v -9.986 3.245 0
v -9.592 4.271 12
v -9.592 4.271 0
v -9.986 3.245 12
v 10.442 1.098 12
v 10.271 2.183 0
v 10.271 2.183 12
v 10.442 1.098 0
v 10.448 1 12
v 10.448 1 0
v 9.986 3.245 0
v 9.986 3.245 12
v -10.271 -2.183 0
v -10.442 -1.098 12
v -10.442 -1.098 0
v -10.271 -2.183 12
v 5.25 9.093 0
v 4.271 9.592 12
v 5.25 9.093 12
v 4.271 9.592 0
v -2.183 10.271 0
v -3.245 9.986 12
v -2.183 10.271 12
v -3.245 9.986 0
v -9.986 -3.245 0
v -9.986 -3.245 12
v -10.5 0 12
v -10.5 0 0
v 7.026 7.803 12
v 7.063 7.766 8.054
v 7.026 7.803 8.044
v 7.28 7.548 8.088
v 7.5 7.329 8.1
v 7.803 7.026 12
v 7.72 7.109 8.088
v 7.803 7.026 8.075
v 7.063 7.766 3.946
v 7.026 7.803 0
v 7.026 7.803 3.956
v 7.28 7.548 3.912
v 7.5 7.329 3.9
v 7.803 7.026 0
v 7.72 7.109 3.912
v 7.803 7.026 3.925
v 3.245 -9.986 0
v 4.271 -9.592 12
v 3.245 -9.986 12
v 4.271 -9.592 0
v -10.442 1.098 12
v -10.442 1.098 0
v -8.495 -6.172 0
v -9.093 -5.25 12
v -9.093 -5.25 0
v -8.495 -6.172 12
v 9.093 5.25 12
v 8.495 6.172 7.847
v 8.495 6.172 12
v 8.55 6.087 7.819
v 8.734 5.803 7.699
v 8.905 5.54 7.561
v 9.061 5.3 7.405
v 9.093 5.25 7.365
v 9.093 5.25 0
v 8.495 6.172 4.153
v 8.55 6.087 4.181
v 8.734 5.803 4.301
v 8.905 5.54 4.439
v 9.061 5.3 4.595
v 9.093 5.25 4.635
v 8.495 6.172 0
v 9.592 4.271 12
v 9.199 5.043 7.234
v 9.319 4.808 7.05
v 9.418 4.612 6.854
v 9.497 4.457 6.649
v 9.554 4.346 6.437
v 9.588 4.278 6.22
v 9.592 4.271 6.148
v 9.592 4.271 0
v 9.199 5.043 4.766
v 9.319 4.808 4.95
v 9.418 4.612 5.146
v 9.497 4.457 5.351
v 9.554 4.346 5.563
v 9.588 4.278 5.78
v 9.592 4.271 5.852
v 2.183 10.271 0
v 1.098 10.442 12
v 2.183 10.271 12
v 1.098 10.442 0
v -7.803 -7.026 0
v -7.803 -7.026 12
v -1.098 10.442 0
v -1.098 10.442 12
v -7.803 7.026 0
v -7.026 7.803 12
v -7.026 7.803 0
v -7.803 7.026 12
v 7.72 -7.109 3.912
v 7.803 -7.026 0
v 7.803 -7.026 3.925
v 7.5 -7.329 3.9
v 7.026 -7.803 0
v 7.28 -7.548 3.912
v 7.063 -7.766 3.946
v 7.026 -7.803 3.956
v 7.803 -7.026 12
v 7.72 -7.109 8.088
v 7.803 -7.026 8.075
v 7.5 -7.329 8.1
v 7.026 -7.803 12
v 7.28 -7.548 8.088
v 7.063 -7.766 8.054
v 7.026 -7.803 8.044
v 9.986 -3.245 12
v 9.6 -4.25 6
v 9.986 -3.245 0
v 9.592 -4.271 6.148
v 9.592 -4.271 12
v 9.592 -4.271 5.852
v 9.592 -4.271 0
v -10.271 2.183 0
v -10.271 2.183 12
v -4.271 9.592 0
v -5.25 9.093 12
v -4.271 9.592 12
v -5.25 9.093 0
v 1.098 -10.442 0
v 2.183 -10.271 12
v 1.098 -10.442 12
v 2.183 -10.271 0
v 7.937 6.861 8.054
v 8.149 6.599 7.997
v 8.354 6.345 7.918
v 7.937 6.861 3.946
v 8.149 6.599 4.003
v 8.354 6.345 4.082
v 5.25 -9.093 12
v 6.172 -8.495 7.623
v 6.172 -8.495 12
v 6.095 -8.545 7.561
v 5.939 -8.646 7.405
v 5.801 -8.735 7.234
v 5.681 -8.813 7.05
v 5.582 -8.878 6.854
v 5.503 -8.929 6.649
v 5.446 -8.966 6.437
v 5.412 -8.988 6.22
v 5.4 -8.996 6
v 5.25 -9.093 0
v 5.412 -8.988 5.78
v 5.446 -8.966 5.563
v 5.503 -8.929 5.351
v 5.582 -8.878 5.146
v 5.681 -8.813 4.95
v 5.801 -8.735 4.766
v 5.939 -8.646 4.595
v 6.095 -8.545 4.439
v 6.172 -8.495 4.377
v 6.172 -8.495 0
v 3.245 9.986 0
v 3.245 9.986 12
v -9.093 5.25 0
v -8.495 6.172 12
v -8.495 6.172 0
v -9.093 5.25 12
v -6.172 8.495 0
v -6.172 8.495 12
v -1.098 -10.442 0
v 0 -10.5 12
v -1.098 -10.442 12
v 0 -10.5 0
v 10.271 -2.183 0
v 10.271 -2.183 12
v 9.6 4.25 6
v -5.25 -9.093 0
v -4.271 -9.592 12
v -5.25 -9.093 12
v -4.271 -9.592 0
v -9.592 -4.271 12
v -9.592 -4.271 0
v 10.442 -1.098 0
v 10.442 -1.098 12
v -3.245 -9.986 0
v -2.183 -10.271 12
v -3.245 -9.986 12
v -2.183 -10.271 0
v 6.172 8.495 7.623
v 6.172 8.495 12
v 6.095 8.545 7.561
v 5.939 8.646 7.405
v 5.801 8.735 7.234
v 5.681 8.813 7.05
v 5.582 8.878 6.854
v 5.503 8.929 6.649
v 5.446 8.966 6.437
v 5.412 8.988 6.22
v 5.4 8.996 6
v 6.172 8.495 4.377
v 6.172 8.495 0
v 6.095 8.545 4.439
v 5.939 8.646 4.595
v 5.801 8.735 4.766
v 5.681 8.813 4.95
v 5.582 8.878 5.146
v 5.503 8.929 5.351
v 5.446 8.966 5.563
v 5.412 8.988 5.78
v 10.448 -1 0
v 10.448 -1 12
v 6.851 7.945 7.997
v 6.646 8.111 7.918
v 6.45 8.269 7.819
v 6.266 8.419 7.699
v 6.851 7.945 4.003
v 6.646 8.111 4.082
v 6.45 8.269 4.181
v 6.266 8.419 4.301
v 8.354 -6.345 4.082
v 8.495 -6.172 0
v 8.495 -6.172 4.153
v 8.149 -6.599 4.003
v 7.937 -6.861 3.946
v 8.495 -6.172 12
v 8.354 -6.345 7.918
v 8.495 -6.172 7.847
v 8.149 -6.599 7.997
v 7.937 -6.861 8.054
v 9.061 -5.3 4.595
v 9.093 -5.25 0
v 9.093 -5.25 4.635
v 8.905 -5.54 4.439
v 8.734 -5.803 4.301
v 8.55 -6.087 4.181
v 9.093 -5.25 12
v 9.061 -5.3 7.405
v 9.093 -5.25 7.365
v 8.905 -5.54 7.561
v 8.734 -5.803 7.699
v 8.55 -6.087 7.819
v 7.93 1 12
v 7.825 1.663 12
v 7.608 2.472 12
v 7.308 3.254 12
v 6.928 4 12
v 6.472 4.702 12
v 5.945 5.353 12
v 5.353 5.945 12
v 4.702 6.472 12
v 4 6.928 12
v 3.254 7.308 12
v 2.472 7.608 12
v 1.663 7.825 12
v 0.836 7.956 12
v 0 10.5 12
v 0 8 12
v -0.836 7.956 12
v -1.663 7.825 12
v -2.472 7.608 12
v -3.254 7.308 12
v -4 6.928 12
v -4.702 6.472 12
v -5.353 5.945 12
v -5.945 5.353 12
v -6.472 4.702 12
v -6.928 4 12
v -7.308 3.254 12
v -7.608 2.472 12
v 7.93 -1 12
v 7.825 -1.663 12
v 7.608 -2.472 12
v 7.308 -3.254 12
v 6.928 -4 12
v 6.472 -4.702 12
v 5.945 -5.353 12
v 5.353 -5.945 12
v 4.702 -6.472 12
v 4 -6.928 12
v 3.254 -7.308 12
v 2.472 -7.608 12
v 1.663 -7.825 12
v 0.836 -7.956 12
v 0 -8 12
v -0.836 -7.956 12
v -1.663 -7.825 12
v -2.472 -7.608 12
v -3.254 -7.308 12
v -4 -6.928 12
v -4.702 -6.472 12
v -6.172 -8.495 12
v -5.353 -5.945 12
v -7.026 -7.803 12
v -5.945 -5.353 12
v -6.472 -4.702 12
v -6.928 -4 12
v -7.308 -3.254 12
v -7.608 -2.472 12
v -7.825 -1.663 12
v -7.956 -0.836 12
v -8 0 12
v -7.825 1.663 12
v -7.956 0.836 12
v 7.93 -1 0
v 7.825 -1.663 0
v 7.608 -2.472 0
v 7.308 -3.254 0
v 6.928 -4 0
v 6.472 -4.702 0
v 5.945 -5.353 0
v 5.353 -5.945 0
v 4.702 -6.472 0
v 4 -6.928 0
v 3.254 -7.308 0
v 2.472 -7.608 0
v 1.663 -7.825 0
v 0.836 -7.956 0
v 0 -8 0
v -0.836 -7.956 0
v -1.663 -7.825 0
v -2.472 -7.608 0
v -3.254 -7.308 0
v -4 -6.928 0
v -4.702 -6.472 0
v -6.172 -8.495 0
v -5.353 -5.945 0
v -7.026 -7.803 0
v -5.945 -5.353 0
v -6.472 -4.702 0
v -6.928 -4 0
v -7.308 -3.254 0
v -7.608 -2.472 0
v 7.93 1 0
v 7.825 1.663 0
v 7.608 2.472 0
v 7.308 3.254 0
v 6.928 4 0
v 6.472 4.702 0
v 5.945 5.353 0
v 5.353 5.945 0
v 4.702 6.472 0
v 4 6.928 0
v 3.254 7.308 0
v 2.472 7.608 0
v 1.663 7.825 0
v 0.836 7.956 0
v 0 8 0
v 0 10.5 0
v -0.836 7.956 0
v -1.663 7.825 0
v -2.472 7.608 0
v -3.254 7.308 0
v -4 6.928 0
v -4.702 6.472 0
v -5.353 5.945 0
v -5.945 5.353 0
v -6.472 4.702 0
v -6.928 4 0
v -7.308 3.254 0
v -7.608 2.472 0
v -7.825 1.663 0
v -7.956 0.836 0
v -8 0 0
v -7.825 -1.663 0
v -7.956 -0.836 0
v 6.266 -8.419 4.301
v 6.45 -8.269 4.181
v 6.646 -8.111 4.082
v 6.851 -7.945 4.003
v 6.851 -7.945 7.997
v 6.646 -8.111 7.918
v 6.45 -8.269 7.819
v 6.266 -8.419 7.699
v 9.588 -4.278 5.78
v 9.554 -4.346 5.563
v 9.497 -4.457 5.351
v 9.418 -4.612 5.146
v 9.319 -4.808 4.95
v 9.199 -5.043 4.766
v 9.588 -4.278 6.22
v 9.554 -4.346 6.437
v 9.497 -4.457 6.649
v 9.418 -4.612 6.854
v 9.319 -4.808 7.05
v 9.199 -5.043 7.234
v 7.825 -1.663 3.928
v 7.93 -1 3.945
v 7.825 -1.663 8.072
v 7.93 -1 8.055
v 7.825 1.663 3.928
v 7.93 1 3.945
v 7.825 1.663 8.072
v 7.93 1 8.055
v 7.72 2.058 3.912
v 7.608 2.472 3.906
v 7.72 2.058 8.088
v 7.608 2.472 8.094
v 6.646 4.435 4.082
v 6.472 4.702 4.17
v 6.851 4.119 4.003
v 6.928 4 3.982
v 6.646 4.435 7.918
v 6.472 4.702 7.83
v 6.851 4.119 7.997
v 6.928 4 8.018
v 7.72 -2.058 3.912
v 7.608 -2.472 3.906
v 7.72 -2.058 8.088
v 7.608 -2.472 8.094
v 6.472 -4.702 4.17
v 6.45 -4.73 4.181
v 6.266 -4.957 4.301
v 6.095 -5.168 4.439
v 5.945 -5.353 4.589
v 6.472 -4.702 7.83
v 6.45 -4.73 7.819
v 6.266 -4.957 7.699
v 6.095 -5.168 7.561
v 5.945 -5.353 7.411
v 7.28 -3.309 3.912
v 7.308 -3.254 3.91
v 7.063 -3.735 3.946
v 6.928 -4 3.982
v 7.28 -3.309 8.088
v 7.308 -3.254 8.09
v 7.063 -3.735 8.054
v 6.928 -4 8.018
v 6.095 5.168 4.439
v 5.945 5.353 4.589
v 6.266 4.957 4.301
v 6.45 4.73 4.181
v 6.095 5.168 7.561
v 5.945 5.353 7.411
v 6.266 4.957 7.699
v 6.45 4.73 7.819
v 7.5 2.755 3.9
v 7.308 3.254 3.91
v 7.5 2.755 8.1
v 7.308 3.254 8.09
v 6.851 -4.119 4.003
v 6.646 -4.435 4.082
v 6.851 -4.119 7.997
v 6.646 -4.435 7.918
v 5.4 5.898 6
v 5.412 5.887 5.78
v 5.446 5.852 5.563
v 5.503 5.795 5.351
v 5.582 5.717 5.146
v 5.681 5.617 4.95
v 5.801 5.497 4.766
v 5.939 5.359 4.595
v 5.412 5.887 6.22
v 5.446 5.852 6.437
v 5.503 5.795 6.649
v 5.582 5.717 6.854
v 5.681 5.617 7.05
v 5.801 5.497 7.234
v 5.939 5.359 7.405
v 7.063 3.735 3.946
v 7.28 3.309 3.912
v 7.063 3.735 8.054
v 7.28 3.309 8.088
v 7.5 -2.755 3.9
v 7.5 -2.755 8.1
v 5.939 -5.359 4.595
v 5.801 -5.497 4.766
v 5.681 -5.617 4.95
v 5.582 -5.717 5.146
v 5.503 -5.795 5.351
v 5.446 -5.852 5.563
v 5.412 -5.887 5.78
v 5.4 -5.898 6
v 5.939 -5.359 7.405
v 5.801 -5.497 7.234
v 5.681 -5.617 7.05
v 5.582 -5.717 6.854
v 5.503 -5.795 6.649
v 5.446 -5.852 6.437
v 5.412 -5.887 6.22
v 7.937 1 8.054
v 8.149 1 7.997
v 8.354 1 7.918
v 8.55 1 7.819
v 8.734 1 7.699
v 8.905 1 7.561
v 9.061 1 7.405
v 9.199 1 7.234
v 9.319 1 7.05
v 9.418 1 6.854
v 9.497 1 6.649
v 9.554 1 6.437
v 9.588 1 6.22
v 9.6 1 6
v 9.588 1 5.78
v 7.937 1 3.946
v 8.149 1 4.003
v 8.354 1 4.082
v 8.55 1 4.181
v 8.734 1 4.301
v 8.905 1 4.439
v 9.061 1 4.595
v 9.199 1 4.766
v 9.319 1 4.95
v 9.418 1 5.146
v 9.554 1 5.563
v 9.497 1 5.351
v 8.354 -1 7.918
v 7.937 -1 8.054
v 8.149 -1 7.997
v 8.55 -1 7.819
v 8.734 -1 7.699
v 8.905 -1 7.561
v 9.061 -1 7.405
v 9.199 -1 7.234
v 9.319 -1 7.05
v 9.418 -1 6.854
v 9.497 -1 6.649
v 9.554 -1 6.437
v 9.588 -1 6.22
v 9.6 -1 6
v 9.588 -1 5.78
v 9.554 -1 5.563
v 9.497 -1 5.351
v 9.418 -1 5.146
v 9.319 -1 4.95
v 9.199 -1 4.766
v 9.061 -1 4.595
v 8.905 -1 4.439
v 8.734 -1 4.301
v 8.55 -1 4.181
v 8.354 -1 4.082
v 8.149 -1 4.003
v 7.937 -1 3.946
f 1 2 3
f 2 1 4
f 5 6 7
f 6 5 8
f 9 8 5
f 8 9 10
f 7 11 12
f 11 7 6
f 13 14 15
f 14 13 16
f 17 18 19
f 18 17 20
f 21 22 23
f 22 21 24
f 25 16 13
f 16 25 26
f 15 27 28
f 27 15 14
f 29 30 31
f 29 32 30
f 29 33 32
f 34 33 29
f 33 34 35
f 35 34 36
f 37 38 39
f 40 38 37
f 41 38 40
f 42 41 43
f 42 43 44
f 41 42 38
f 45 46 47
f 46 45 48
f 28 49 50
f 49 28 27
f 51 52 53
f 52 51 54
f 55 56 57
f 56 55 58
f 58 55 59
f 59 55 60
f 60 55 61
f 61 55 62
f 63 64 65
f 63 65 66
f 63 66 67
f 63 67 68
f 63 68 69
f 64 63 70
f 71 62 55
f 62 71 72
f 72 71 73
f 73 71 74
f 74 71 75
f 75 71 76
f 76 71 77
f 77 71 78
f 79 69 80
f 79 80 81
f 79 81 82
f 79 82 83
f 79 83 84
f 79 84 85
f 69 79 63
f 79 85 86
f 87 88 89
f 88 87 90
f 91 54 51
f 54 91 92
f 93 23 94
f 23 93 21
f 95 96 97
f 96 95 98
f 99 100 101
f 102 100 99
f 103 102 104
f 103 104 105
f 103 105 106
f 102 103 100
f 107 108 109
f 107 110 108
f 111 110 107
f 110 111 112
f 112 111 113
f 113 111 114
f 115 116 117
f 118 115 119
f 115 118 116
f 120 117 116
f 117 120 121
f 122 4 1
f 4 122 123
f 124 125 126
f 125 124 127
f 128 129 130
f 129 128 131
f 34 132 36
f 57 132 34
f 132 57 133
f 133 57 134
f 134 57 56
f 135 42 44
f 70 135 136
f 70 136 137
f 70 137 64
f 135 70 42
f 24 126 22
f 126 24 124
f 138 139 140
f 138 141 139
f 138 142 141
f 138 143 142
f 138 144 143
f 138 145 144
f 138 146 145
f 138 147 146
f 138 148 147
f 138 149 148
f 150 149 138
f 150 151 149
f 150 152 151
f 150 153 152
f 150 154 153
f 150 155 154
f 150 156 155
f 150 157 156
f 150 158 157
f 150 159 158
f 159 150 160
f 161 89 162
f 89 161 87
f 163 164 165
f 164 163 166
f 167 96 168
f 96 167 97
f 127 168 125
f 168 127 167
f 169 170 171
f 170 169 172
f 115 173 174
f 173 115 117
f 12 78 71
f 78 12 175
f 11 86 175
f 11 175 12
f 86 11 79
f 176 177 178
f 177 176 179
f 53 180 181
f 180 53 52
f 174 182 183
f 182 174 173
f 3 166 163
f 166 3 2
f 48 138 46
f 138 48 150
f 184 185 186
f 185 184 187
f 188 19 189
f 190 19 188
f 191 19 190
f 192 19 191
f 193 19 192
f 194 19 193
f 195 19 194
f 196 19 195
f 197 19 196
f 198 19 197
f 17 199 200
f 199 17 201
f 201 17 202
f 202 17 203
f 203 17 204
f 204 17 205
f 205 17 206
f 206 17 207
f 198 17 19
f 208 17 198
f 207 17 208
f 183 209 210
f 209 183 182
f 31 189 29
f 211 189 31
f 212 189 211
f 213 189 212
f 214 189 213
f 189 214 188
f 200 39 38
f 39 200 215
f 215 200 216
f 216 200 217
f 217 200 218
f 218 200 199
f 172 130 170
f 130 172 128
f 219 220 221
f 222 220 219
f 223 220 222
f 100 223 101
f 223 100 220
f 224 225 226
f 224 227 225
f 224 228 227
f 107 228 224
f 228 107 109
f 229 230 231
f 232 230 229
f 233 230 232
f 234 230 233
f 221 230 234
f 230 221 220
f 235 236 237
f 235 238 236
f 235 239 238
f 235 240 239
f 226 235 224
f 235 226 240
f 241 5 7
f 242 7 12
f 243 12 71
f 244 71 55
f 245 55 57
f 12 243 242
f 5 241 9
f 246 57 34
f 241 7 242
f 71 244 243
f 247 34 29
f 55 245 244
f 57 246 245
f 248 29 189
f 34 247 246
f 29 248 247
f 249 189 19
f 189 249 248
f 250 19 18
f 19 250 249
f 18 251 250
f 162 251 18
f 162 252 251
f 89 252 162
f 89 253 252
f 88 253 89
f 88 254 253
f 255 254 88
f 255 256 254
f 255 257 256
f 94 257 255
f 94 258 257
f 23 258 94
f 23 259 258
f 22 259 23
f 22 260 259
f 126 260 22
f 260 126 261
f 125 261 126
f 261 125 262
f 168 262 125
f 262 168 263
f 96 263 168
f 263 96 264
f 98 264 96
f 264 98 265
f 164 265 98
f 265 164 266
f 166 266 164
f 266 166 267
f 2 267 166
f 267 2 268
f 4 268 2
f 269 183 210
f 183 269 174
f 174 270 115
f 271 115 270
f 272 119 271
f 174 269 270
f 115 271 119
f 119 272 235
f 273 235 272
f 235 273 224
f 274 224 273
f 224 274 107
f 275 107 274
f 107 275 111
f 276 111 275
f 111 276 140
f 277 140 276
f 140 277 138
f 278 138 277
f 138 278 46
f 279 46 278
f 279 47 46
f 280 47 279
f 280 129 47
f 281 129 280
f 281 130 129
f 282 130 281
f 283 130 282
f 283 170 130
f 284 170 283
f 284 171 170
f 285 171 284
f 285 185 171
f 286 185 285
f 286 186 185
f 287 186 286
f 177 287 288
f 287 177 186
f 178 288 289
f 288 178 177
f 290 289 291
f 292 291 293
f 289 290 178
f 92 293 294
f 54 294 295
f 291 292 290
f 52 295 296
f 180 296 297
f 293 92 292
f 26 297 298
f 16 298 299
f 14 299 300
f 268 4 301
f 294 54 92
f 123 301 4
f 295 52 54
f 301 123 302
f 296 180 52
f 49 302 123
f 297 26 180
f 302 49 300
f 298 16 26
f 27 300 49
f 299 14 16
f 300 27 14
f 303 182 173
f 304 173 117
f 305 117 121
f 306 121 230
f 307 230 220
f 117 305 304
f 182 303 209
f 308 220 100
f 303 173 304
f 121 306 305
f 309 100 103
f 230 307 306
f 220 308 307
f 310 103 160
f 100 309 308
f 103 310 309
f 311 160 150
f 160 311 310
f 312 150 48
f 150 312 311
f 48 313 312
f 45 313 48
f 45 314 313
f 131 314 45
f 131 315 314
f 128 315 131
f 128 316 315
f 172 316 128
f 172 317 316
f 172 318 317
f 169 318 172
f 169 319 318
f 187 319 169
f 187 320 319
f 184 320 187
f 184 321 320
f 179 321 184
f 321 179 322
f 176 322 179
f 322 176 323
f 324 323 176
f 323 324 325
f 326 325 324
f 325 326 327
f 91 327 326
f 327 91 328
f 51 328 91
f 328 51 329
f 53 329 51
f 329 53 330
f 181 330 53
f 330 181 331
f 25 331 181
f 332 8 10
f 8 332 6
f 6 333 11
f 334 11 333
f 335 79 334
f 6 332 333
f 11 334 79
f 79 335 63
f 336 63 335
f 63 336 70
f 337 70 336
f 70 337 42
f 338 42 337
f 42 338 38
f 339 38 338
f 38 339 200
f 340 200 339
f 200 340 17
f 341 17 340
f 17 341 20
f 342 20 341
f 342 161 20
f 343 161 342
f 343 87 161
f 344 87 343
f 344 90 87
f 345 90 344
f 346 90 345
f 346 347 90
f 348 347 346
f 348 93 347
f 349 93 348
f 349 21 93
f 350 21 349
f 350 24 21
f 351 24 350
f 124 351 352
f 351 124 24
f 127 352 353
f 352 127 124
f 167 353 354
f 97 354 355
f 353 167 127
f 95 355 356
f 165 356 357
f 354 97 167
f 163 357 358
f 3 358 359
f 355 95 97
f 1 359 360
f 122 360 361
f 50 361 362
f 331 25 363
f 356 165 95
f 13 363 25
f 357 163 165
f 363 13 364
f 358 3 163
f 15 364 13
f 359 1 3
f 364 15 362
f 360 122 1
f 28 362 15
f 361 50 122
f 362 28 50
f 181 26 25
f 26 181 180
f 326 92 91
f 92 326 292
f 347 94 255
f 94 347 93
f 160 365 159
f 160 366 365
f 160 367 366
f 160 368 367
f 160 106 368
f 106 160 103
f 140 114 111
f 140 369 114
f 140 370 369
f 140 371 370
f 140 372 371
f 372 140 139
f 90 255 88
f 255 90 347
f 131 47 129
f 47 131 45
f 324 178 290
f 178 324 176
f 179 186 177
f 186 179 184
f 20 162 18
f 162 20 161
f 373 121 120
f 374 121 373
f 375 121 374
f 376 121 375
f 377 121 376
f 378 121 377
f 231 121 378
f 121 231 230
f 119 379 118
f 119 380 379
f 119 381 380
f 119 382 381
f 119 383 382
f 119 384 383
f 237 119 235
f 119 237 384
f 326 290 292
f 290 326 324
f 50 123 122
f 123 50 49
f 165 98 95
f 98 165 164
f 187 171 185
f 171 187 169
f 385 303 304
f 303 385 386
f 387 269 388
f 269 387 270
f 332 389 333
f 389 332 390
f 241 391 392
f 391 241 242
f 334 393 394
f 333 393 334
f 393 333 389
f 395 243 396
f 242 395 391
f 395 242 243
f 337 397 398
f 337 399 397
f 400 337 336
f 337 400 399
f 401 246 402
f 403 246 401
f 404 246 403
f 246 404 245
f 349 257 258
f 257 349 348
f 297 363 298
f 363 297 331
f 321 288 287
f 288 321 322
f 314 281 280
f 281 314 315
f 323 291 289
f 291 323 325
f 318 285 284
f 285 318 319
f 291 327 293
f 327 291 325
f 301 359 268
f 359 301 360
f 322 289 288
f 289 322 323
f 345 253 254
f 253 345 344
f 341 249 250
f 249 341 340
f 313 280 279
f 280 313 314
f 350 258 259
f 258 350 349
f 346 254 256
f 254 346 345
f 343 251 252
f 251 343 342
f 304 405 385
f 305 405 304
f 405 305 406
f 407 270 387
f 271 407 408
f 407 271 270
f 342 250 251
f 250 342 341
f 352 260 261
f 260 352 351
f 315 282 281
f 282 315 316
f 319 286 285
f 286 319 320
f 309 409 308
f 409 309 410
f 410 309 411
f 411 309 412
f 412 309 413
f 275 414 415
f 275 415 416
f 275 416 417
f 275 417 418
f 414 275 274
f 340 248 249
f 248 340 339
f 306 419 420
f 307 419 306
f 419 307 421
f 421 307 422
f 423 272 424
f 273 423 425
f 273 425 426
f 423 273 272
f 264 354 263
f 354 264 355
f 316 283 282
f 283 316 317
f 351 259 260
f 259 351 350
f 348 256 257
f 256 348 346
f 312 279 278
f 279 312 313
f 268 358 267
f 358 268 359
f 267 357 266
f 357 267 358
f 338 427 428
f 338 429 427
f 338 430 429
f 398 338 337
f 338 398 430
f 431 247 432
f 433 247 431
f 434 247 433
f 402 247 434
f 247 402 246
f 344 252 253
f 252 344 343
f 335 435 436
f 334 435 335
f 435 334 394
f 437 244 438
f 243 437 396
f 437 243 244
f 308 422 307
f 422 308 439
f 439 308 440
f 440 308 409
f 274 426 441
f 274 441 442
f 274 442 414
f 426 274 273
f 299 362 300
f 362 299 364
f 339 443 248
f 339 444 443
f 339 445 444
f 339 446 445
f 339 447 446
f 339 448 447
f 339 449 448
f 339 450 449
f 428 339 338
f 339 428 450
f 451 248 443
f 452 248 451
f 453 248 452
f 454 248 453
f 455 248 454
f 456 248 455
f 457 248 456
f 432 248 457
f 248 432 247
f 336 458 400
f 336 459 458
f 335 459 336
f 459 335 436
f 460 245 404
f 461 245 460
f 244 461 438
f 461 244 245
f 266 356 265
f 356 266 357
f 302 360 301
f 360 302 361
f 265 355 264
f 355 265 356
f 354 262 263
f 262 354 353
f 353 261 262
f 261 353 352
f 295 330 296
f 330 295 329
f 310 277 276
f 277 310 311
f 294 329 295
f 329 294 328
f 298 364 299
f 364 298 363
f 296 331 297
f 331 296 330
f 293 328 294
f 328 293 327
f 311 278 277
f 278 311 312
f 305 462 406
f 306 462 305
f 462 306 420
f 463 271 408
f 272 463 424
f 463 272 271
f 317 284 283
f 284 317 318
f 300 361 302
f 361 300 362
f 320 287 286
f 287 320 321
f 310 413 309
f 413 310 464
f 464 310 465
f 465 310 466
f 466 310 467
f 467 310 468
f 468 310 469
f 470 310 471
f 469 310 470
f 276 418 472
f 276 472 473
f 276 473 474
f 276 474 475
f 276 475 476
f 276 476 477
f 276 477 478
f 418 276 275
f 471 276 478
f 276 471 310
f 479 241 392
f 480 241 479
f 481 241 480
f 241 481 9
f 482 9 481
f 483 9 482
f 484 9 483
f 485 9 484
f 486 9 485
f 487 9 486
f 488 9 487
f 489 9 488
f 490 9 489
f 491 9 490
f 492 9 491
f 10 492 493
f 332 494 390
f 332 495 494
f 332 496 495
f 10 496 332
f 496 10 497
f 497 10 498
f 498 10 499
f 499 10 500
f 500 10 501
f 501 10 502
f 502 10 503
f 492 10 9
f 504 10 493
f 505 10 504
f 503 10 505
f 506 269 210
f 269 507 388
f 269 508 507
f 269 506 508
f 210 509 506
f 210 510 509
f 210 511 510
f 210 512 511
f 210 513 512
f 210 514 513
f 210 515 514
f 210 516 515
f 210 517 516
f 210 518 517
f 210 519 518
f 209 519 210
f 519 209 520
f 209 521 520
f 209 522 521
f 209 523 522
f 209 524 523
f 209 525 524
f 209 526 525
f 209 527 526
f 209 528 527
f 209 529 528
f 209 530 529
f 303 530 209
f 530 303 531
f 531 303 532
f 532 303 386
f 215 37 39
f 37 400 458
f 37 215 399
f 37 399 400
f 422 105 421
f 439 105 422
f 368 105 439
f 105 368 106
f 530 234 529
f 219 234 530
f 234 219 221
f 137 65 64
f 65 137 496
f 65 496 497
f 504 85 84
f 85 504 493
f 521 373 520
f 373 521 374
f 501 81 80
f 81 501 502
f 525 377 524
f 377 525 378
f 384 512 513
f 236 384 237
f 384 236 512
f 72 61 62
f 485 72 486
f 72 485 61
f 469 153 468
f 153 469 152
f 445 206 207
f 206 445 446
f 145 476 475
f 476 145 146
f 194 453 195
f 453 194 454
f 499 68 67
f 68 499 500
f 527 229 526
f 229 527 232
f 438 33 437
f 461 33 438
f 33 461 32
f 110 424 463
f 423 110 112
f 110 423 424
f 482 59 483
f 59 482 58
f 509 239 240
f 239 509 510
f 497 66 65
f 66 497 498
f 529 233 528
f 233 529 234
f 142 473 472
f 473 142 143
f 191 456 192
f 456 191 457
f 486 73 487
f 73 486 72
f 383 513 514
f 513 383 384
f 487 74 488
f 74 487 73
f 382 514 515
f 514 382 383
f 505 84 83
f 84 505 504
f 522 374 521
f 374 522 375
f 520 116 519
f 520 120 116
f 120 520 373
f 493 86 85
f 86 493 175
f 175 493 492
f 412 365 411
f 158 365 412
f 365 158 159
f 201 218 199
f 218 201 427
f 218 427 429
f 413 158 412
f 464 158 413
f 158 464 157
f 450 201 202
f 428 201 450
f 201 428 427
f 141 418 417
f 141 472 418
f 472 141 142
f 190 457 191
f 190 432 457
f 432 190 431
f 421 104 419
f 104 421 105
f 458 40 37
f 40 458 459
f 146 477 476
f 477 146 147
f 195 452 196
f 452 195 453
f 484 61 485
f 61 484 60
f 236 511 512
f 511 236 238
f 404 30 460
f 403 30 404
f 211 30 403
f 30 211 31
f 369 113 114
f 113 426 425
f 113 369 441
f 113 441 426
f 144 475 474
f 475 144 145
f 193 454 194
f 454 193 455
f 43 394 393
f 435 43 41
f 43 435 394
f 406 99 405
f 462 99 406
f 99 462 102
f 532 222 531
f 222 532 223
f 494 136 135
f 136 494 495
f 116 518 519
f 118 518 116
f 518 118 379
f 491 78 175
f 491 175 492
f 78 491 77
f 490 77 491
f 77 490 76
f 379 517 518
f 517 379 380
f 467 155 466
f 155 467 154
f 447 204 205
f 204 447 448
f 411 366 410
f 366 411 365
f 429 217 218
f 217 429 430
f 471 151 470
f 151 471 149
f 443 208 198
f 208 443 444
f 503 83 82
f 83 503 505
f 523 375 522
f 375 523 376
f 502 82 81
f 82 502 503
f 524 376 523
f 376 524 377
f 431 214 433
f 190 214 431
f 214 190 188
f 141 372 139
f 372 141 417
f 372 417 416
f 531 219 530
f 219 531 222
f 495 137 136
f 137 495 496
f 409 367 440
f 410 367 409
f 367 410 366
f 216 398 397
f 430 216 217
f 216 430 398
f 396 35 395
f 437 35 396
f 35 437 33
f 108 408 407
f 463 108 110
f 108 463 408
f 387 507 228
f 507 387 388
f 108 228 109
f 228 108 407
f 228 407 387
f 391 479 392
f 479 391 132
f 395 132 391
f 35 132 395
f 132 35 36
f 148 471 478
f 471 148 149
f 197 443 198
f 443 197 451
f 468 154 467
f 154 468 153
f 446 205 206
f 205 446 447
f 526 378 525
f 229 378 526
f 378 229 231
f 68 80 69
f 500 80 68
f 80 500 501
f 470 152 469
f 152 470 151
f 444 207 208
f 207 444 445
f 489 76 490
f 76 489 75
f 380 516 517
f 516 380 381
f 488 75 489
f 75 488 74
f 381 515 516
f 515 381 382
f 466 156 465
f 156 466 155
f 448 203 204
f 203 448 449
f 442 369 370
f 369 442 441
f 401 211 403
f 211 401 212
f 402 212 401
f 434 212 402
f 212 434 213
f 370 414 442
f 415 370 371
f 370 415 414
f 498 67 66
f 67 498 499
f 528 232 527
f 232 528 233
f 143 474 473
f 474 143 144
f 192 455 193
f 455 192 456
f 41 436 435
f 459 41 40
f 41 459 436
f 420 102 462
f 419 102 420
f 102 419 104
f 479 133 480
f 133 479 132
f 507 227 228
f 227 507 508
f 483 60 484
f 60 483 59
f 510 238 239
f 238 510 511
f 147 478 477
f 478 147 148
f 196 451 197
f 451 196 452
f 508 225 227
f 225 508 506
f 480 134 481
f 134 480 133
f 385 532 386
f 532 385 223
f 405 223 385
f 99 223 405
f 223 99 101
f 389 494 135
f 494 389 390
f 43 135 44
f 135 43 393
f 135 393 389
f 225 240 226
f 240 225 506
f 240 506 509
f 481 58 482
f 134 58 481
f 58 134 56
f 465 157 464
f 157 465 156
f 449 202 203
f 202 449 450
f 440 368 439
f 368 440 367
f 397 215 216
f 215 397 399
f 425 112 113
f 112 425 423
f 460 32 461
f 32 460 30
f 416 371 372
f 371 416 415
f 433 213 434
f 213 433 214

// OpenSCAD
// C-style pipe clamp.
$fn = 60;
eps = 0.02;
pipe_d = 16;
wall = 2.5;
outer_d = pipe_d + 2 * wall;
width = 12;
slit = 2;
difference() {
    cylinder(d=outer_d,h=width);
    translate([0,0,-eps]) cylinder(d=pipe_d,h=width+2*eps);
    translate([0,-slit/2,-eps]) cube([outer_d/2+eps,slit,width+2*eps]);
    translate([outer_d/2-3,-outer_d/2-eps,width/2]) rotate([-90,0,0]) cylinder(d=4.2,h=outer_d+2*eps);
}
